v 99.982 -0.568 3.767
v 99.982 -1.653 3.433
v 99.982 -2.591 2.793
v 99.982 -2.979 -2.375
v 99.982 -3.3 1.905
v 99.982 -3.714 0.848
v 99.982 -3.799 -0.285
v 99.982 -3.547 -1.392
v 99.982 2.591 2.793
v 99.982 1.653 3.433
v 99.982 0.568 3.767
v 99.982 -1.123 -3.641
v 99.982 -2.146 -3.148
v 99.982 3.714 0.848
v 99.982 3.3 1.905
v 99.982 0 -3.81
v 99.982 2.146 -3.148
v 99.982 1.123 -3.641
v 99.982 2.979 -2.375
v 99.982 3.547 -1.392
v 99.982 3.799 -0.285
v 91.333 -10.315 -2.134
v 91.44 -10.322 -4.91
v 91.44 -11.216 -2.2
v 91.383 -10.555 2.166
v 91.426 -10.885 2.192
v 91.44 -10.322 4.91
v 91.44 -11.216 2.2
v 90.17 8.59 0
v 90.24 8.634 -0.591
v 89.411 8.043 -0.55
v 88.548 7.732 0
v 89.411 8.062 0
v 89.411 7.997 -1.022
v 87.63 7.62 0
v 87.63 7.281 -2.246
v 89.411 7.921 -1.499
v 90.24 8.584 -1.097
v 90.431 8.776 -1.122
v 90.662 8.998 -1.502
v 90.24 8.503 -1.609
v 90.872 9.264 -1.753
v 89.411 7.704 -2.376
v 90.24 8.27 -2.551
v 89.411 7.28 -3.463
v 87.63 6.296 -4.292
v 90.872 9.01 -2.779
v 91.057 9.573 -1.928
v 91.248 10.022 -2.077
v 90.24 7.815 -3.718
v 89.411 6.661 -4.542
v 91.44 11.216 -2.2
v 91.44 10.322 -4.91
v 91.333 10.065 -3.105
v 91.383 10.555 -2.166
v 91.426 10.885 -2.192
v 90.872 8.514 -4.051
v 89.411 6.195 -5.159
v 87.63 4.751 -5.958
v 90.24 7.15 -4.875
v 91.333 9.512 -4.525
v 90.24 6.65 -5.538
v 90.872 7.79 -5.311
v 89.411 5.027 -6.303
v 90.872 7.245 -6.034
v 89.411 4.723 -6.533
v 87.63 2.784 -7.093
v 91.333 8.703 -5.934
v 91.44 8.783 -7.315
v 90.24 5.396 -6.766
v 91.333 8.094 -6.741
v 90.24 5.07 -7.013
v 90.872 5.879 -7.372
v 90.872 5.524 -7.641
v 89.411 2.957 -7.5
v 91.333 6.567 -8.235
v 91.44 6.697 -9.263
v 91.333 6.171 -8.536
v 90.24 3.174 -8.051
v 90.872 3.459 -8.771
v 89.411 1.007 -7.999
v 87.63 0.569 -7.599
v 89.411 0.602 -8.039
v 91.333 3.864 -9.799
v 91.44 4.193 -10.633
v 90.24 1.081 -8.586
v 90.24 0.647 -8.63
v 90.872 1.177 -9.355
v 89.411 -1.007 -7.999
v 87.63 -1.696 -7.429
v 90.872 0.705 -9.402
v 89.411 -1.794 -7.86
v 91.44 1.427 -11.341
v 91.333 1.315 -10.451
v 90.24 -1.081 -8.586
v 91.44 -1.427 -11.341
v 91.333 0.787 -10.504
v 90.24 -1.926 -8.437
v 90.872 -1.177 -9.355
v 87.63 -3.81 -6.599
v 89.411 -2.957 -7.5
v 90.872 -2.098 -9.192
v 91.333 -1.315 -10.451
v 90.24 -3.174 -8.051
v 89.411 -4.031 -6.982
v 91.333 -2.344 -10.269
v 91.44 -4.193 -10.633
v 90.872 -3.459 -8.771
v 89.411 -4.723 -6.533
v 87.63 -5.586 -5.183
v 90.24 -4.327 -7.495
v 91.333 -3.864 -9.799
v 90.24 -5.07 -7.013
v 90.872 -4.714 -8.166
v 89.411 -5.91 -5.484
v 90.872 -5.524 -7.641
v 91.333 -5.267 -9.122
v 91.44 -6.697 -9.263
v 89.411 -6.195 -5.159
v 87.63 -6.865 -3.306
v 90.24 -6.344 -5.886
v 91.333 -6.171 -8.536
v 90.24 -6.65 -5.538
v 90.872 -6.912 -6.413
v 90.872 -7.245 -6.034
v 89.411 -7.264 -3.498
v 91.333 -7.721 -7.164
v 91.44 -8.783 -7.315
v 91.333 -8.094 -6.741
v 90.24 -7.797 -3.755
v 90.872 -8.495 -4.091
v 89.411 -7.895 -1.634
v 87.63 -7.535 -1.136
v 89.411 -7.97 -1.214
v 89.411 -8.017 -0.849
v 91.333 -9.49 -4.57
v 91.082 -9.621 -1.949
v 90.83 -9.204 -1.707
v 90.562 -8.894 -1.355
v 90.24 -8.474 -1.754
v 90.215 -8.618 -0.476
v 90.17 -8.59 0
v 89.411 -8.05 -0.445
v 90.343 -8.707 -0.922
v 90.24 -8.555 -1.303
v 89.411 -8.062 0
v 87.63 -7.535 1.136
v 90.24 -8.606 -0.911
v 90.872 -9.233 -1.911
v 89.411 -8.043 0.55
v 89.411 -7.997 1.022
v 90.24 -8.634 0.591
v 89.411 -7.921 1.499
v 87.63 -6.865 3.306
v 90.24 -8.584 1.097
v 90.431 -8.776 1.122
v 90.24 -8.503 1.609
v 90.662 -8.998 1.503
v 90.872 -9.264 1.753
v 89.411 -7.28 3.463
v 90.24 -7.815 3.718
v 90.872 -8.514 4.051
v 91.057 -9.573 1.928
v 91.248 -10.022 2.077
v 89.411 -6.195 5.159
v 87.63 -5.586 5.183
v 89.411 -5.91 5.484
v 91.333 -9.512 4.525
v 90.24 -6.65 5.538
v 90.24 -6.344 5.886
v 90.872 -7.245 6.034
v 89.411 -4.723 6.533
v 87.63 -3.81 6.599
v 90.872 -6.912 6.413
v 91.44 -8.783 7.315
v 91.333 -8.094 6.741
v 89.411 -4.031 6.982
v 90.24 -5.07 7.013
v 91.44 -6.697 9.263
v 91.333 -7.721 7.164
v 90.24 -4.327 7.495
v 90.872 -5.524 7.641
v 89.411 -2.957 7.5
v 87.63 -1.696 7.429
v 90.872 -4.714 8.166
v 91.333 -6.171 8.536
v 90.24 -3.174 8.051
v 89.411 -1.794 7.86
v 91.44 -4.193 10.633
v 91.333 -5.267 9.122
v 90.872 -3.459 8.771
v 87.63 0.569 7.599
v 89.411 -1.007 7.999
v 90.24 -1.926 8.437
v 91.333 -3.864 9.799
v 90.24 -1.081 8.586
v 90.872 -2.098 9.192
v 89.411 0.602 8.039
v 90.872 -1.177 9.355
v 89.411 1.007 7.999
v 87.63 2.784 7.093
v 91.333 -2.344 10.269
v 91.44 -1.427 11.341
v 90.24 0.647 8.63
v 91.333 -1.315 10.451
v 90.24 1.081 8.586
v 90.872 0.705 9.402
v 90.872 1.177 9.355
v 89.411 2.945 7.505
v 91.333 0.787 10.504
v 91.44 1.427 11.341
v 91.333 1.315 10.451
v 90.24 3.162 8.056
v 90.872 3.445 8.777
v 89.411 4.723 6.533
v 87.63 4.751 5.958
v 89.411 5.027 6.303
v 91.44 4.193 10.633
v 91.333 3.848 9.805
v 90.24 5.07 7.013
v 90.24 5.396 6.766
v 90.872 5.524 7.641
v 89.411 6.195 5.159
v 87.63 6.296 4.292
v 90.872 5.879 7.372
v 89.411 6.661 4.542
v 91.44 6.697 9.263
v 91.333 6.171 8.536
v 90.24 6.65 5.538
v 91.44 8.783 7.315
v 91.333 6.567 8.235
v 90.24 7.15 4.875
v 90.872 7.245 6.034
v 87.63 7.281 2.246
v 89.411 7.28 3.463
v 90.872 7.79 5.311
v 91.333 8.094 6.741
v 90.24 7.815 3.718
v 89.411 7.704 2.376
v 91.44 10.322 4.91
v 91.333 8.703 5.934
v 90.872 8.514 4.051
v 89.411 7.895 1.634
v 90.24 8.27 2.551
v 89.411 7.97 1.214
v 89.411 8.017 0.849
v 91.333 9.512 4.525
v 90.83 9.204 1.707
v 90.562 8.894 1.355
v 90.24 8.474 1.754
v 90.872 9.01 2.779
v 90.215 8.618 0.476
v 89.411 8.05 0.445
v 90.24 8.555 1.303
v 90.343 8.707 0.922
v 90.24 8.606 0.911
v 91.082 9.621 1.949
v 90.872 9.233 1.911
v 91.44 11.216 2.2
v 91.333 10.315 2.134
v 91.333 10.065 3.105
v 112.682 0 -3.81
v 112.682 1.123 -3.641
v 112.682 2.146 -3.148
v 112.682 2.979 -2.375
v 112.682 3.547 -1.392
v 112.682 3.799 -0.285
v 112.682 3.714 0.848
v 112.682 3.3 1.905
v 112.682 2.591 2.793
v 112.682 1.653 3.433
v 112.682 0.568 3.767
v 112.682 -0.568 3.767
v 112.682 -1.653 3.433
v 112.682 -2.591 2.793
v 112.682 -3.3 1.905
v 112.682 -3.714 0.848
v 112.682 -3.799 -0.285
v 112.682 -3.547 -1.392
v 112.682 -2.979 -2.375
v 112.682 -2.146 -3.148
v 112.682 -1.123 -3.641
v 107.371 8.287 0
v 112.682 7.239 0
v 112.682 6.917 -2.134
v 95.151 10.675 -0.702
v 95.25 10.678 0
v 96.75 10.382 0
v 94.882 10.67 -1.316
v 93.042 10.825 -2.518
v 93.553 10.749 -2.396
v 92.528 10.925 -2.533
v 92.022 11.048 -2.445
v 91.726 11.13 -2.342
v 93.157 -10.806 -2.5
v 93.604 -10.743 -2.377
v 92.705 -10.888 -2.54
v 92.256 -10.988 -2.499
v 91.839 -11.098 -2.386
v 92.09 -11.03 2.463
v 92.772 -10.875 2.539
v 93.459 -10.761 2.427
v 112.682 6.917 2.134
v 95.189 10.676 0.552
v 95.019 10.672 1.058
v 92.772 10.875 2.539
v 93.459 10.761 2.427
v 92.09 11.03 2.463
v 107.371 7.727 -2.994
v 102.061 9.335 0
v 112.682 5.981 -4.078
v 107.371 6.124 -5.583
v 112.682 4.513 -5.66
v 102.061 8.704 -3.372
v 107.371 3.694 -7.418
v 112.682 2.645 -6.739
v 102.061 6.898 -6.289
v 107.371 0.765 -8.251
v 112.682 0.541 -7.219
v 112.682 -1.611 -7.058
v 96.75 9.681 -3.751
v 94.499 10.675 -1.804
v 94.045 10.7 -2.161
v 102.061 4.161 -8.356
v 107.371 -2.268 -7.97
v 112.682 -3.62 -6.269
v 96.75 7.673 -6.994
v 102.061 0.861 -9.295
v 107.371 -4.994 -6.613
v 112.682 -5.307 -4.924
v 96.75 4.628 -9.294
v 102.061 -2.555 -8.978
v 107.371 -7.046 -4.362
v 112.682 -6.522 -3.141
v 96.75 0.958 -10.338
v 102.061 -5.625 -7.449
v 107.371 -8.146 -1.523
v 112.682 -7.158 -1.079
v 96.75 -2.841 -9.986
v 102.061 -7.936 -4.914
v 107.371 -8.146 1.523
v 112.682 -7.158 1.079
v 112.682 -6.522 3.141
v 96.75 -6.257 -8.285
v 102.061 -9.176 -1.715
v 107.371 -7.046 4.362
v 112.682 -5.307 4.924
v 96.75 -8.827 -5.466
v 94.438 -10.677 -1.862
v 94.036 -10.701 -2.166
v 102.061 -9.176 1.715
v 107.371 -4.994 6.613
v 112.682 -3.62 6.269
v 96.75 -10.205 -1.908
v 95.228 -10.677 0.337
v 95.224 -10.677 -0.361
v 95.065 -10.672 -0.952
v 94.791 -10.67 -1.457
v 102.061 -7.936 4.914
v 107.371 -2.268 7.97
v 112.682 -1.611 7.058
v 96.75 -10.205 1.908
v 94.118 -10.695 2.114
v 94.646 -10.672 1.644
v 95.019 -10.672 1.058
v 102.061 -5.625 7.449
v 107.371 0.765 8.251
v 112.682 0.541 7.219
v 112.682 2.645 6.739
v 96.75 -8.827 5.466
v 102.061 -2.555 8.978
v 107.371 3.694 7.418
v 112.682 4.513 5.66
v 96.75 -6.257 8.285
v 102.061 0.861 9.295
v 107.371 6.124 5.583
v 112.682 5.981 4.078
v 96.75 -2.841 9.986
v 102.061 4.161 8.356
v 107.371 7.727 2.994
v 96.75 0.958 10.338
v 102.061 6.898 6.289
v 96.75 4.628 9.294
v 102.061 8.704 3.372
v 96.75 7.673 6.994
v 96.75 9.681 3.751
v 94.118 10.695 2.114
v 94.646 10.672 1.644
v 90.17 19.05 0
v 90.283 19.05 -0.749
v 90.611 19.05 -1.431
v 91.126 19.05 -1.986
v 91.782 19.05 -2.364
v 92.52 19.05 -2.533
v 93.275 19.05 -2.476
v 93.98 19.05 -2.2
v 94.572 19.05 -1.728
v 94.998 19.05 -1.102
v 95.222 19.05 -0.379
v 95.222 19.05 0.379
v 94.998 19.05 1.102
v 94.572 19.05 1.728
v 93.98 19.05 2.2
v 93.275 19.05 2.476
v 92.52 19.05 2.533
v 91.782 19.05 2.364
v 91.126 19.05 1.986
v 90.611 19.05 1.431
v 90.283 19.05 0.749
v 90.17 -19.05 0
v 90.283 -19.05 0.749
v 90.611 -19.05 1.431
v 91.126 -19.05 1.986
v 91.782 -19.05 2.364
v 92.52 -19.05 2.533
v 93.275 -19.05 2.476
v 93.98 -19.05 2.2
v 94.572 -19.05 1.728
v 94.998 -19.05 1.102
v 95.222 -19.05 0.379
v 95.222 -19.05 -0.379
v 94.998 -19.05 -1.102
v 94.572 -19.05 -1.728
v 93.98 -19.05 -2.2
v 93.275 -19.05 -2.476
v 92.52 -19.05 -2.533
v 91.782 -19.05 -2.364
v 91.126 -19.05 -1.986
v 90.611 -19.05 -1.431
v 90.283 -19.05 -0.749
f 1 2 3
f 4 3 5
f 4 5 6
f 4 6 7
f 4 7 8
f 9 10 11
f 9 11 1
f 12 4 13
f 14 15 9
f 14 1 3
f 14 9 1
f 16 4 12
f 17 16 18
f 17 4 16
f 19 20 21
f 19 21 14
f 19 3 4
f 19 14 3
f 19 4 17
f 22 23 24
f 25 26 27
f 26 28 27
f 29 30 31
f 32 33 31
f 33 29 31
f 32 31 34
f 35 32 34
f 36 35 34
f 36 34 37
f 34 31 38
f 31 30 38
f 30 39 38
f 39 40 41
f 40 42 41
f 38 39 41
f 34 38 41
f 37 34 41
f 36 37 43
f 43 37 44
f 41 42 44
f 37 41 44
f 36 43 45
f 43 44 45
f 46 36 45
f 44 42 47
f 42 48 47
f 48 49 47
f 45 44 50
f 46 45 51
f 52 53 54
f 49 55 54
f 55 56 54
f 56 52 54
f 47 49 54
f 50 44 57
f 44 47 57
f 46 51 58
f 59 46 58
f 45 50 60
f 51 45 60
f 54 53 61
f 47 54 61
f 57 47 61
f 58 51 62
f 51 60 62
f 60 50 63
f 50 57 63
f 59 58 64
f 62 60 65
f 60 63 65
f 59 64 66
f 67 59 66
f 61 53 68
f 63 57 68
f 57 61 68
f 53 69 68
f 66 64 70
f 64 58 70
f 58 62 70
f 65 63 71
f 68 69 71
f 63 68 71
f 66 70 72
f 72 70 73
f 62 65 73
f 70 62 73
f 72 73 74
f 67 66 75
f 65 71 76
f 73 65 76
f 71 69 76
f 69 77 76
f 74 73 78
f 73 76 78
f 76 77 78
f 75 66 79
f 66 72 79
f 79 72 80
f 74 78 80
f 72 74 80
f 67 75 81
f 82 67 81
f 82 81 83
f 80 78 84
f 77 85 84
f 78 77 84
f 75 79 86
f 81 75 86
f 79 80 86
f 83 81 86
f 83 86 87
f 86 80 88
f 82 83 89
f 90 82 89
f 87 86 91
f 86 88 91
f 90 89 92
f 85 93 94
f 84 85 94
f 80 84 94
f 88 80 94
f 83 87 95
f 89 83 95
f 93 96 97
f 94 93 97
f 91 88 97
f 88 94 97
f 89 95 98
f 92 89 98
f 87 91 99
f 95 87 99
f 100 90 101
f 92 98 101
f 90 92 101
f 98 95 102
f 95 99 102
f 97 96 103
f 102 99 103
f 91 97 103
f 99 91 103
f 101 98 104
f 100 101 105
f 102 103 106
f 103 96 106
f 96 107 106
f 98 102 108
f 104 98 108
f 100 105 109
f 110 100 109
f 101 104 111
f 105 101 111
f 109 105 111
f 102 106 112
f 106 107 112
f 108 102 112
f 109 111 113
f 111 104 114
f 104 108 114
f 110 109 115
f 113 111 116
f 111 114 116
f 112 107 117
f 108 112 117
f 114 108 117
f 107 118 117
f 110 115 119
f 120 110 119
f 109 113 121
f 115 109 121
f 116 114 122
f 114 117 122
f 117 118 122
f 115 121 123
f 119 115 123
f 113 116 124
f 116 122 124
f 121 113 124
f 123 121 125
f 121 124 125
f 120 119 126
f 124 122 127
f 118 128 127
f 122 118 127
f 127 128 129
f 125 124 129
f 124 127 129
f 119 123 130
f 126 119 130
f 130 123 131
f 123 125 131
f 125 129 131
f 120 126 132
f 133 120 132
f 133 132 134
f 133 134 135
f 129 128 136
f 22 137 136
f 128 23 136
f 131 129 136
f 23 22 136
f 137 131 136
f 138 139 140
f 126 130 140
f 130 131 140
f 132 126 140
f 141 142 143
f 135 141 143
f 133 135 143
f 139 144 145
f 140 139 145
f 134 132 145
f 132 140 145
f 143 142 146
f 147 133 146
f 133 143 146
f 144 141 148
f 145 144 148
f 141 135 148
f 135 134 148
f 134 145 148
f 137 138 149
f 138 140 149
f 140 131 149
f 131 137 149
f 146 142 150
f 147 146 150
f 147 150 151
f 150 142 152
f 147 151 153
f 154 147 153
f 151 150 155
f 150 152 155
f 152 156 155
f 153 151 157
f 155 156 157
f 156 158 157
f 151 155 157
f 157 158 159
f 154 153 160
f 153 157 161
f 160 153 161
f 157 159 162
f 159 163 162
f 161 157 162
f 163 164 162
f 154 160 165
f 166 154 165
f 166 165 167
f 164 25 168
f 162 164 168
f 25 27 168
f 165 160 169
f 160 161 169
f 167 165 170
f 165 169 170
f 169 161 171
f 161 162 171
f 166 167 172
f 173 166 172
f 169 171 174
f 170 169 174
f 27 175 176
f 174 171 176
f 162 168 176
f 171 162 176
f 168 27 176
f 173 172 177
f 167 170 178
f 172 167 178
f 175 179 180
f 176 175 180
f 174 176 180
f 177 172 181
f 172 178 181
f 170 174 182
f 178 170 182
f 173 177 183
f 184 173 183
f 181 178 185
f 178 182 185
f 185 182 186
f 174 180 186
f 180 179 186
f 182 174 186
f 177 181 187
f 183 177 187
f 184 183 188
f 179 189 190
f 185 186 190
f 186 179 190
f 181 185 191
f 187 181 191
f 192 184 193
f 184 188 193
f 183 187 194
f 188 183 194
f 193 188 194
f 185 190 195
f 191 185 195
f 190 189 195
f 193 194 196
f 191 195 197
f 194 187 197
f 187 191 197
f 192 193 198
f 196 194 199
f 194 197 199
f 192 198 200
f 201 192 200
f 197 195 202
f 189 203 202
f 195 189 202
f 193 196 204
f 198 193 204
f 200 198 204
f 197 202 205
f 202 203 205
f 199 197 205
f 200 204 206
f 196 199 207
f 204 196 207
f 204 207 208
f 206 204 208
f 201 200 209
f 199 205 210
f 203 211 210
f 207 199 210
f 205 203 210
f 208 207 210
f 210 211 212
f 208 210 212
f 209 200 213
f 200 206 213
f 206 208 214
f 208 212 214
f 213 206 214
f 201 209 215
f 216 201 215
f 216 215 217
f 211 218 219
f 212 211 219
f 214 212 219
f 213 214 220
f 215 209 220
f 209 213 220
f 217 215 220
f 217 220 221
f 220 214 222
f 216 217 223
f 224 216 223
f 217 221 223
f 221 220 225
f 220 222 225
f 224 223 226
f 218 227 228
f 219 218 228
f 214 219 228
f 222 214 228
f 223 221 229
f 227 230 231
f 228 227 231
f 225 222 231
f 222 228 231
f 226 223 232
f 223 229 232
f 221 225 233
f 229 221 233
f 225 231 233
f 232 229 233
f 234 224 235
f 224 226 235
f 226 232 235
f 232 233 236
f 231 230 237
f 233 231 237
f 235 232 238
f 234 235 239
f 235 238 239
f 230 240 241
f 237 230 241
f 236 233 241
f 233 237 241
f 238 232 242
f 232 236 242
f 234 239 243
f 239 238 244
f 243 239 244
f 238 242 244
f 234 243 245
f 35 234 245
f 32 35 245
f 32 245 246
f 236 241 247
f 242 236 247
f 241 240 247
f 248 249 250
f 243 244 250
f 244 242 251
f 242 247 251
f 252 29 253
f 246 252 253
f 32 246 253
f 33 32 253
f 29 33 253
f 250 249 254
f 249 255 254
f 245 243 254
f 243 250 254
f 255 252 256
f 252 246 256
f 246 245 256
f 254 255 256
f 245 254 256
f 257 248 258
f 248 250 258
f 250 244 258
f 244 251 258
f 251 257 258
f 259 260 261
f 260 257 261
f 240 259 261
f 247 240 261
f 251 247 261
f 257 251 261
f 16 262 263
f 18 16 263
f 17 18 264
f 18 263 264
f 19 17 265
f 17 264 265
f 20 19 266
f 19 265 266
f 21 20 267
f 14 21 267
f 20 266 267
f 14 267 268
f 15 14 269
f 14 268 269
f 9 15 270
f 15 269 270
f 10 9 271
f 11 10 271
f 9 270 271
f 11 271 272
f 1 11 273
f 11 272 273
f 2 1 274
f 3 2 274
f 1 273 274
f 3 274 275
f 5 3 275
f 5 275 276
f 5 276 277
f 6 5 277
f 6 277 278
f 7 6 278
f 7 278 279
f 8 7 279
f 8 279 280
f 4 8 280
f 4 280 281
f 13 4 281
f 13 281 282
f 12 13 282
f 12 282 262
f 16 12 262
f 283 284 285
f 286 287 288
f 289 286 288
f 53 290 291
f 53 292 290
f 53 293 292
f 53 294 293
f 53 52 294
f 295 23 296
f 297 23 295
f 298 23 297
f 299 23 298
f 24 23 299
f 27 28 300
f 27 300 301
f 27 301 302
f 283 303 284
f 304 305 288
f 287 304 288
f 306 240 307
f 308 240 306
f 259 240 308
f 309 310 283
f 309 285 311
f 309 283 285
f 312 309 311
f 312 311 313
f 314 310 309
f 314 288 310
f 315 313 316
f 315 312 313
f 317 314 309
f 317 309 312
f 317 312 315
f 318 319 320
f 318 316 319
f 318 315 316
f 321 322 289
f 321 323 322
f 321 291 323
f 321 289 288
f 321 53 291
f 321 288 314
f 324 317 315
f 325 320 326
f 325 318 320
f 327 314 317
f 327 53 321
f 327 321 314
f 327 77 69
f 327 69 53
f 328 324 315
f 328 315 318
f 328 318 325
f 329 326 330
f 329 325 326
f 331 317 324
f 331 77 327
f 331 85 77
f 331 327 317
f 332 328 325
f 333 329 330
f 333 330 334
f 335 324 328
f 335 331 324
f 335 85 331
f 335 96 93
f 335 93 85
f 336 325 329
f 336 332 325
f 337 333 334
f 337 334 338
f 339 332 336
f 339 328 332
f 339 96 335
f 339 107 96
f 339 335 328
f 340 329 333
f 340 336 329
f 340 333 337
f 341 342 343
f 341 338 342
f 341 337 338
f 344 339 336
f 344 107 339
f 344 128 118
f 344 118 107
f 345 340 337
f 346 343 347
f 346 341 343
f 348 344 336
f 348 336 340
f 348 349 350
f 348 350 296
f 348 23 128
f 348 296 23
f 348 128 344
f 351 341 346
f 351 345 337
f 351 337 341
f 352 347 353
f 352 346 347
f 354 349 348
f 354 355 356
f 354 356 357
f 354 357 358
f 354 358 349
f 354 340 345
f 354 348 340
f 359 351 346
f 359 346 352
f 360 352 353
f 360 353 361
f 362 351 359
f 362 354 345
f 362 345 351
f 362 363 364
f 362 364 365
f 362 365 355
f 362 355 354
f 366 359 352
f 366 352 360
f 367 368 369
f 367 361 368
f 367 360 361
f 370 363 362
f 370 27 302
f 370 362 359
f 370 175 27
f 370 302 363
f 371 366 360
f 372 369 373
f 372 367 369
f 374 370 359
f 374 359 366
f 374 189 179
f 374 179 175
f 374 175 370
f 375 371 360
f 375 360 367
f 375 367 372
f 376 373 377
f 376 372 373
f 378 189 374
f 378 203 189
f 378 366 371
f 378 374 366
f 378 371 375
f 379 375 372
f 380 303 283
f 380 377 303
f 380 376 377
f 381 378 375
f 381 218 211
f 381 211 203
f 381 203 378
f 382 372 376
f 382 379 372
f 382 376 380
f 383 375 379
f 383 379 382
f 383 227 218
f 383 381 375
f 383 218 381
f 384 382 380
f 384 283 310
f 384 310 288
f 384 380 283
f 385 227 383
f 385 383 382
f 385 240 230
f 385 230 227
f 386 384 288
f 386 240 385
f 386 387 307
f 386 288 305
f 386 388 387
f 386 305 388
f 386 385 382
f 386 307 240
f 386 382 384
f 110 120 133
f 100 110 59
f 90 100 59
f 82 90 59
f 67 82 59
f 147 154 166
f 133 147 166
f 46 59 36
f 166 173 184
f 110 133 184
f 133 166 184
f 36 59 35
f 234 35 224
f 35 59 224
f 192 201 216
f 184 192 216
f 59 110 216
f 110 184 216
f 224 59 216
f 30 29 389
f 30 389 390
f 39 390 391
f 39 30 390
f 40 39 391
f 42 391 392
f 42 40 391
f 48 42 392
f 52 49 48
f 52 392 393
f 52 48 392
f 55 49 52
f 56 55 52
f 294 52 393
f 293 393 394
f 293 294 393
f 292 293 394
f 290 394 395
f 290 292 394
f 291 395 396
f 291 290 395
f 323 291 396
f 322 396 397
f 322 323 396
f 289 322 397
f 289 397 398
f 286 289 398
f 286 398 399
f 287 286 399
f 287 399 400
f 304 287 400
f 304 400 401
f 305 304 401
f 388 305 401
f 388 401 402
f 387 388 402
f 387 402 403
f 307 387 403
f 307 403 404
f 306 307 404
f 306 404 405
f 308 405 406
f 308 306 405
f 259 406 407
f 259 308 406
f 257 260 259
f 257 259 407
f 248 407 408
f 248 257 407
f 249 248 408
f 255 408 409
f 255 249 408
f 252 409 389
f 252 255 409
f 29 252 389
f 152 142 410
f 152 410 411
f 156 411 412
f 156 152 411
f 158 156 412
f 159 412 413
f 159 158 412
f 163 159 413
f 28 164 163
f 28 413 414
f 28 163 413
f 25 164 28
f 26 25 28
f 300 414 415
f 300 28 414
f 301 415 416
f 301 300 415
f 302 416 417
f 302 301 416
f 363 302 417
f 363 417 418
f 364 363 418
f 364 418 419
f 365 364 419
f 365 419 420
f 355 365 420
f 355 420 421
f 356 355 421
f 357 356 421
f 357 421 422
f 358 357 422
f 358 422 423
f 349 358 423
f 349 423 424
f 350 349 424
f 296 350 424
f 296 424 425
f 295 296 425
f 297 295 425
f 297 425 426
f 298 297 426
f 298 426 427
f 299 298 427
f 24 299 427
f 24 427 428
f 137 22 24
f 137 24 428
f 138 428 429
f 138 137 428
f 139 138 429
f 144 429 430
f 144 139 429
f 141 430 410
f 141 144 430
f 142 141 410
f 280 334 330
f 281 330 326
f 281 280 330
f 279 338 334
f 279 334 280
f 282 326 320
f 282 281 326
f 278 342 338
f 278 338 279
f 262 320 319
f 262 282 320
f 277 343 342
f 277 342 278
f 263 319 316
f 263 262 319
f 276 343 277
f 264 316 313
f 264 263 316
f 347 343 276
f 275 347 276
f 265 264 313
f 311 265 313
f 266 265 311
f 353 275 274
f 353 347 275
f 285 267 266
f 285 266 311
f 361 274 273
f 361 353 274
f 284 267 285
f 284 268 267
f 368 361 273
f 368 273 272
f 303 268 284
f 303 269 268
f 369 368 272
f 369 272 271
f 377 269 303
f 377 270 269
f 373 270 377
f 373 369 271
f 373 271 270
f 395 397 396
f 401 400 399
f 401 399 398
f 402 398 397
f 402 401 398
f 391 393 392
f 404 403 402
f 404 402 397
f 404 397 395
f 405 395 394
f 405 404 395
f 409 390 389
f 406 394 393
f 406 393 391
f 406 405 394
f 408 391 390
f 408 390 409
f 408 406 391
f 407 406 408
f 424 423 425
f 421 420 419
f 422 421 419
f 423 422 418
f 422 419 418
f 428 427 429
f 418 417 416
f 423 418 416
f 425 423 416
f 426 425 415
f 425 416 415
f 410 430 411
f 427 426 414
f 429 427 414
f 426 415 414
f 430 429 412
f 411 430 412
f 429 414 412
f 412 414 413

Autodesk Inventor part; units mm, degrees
ref_plane "YZ Plane" through (0, 0, 0) normal (1, 0, 0) x (0, 1, 0)
ref_plane "XZ Plane" through (0, 0, 0) normal (0, 1, 0) x (-1, 0, 0)
ref_plane "XY Plane" through (0, 0, 0) normal (0, 0, 1) x (1, 0, 0)
sketch "Sketch1" plane through (0, 0, 0) normal (0, 0, 1) x (1, 0, 0)
  line L0 (87.63, 0) -> (112.6819, 0)
  line L1 (112.6819, 0) -> (112.6819, 7.239)
  line L2 (112.6819, 7.239) -> (91.44, 11.43)
  line L3 (87.63, 11.43) -> (87.63, 7.62) construction
  line L4 (85.09, -8.9952) -> (85.09, 8.9952) projected
  line L5 (85.09, 0) -> (87.63, 0) construction
  arc A0 (91.44, 11.43) -> (87.63, 7.62) centre (87.63, 11.43) ccw construction
  arc A1 (87.63, 7.62) -> (91.44, 11.43) centre (87.63, 11.43) ccw
  line L6 (87.63, 7.62) -> (87.63, 0)
  line L7 (91.44, 11.43) -> (87.63, 11.43) construction
  point P0 (0, 0)
  dimension "d0" = 25.4
  dimension "d1" = 11.43
  dimension "d2" = 2.54
  dimension "d3" = 7.62
  dimension "d5" = 7.239
revolve "Revolution1" add sketch "Sketch1" angle 360 about axis through (87.63, 0, 0) along (1, 0, 0)
sketch "Sketch2" plane through (0, 0, 0) normal (0, 1, 0) x (-1, 0, 0)
  circle A0 centre (-92.71, 0) radius 2.54 projected
  circle A1 centre (-92.71, 0) radius 2.54 projected
  circle A2 centre (-92.71, 0) radius 2.54 projected
  circle A3 centre (-92.71, 0) radius 2.54 projected
  circle A4 centre (-92.71, 0) radius 2.54
  point P0 (0, 0)
extrude "Extrusion1" add sketch "Sketch2" along normal mid plane 38.1
sketch "Sketch3" plane through (112.6819, 0, 0) normal (1, 0, 0) x (0, 0, -1)
  circle A0 centre (0, 0) radius 3.81
  dimension "d8" = 7.62
extrude "Extrusion2" cut sketch "Sketch3" against normal blind 12.7
properties part number "Arm_Wheel_Attachment"
